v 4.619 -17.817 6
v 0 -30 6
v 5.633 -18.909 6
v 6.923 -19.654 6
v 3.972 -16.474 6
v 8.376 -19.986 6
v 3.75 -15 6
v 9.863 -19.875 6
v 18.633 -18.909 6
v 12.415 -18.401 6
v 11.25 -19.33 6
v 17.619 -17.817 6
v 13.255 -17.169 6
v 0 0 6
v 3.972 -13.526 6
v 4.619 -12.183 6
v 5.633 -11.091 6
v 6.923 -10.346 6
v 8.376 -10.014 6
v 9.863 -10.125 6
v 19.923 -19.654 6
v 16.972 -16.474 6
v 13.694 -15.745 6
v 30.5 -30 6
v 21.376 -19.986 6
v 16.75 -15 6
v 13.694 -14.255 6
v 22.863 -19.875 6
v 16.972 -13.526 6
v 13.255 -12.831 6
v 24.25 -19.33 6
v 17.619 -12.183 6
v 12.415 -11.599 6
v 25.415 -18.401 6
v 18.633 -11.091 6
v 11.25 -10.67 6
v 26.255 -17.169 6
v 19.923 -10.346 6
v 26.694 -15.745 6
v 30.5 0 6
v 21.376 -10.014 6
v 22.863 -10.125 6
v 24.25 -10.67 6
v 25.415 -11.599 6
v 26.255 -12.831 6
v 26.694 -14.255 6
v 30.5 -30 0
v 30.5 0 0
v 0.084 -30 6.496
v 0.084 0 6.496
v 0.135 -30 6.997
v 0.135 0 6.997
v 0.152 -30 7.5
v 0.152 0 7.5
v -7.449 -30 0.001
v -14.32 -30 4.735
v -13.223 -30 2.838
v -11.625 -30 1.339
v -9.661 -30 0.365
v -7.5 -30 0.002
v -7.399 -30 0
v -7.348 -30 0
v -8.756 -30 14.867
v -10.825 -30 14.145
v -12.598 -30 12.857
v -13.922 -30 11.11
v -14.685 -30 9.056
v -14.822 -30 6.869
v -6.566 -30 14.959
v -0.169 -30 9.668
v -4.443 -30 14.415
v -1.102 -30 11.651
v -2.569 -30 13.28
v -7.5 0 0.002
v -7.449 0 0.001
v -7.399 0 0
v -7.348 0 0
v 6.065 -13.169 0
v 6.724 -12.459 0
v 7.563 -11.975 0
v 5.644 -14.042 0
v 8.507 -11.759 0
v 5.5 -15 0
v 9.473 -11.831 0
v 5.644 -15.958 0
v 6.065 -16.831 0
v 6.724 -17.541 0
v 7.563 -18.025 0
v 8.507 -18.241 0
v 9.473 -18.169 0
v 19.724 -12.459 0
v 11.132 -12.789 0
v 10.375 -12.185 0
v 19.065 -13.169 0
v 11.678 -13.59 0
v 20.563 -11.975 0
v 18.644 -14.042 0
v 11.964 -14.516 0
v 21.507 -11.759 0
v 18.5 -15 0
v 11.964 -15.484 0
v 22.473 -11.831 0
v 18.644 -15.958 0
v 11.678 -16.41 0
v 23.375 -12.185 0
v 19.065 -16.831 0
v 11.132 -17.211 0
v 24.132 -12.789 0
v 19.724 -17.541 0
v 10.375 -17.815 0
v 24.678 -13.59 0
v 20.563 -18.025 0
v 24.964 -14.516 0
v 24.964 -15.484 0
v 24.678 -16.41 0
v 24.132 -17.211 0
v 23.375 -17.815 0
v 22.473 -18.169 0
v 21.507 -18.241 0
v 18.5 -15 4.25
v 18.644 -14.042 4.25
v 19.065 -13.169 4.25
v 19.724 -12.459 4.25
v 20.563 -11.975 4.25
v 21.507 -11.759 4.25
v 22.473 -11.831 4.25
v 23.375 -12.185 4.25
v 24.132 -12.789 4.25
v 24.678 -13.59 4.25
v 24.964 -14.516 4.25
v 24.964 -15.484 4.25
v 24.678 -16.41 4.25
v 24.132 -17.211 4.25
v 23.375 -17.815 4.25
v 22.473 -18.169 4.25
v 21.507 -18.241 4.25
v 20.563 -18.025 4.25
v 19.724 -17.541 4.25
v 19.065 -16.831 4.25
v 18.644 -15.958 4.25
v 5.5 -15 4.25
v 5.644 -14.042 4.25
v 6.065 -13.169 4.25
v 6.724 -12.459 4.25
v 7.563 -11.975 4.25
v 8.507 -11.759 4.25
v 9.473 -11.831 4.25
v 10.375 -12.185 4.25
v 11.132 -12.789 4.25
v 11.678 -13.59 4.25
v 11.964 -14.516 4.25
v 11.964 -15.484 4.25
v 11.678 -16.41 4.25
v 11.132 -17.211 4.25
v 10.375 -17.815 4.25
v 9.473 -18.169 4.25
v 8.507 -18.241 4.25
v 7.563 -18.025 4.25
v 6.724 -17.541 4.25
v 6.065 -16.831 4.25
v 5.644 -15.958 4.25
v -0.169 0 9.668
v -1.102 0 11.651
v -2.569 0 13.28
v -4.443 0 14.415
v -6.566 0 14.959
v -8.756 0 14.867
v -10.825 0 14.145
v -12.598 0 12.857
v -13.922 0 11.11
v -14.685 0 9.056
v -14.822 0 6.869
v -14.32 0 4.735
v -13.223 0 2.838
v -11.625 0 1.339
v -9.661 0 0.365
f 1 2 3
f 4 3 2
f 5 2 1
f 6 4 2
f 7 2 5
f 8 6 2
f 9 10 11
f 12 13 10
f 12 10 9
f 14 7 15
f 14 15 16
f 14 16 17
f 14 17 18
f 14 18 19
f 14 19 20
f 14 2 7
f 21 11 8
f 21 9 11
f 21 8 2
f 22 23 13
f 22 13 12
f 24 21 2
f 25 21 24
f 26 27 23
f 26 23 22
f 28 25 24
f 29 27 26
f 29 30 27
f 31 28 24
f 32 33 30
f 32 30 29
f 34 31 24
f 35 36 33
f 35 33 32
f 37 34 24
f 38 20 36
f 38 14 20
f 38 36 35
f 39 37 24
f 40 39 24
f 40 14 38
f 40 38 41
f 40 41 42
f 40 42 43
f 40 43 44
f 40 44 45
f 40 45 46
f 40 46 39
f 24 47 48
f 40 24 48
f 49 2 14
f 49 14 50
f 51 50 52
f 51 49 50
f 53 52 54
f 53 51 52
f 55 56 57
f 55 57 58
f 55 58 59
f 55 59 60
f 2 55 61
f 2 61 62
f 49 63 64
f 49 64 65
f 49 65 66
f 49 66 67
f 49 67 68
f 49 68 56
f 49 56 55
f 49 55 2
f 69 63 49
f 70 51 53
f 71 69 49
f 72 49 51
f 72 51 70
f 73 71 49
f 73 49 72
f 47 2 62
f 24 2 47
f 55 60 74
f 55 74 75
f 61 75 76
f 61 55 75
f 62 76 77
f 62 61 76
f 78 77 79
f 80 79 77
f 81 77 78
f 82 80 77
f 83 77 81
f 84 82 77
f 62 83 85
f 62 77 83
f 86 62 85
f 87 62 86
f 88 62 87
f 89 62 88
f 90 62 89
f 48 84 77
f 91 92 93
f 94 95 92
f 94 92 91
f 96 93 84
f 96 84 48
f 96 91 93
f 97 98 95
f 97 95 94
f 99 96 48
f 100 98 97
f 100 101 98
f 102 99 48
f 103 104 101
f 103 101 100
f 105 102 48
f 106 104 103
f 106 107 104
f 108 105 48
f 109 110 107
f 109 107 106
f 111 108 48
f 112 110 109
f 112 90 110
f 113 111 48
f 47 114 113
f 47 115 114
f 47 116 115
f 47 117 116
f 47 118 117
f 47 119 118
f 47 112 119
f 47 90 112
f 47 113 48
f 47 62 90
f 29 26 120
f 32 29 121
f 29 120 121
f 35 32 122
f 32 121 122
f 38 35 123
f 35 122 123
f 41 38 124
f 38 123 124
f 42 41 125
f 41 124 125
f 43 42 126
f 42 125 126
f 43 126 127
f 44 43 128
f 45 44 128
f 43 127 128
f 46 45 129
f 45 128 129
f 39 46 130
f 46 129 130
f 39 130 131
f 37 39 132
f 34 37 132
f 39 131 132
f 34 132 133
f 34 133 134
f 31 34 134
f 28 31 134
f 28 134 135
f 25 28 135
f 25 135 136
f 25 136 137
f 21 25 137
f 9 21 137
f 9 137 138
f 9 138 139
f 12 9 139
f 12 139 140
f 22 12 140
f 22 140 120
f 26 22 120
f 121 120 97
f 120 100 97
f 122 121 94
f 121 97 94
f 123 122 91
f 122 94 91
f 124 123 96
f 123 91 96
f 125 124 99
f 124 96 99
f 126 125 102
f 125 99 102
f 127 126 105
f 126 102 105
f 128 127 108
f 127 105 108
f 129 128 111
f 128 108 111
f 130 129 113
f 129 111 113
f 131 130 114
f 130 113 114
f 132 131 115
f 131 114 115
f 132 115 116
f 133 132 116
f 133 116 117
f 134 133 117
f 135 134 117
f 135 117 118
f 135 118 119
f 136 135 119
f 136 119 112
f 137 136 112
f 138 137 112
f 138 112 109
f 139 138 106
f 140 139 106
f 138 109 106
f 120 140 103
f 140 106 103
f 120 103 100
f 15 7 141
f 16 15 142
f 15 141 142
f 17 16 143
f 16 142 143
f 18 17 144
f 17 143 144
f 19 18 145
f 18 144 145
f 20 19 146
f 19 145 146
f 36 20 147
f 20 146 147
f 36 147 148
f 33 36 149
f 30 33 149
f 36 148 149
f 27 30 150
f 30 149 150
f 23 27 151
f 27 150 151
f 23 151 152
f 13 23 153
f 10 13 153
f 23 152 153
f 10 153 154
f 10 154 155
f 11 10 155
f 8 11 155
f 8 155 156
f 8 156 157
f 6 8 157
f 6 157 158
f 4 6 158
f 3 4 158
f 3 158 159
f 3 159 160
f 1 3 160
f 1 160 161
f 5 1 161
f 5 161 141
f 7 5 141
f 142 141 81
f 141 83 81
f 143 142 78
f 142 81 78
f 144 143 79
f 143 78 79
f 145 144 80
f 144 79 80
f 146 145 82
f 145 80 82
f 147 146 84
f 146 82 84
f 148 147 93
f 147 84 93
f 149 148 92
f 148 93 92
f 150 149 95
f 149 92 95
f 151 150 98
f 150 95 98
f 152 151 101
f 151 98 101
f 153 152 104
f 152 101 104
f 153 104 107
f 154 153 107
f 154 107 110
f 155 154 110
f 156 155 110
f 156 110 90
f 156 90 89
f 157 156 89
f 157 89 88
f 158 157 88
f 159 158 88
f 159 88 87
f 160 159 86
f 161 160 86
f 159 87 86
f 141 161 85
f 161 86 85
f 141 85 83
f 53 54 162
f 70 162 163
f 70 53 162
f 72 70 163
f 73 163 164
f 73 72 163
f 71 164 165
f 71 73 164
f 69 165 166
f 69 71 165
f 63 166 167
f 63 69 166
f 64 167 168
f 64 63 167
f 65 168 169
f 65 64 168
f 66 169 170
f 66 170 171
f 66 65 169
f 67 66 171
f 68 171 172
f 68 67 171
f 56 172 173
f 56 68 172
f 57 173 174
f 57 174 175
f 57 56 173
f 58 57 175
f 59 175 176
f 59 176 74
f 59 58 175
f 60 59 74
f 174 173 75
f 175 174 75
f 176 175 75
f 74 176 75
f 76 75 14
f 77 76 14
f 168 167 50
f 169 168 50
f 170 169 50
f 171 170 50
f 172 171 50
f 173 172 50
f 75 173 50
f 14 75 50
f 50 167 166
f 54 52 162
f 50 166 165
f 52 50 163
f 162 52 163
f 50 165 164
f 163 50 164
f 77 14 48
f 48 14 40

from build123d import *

# Parameters (mm, degrees)
SKETCH_1_W                   = 30.5
SKETCH_1_H                   = 30
EXTRUDE_1_DEPTH              = 6
HOLE_WIZARD_M6_1_D           = 6.5
HOLE_WIZARD_M6_1_CSINK_D     = 10
HOLE_WIZARD_M6_1_CSINK_ANGLE = 90
EXTRUDE_3_DEPTH              = 30


with BuildPart() as part:
    # 草图1 → 凸台-拉伸1 (new body)
    with BuildSketch(Plane.XY):
        with Locations((15.25, -15)):
            Rectangle(SKETCH_1_W, SKETCH_1_H)
    extrude(amount=EXTRUDE_1_DEPTH)

    # M6 内六角花形半沉头螺钉的锥形沉头孔1 (through all)
    with Locations(Plane.XY.offset(6)):
        with Locations((8.75, -15), (21.75, -15)):
            CounterSinkHole(HOLE_WIZARD_M6_1_D / 2, HOLE_WIZARD_M6_1_CSINK_D / 2, counter_sink_angle=HOLE_WIZARD_M6_1_CSINK_ANGLE)

    # 草图5 → 凸台-拉伸3 (add)
    with BuildSketch(Plane.XZ.offset(30)):
        with BuildLine():
            ThreePointArc((0.151530772, 7.5), (-12.597922496, 12.856607172), (-7.5, 0.001530928))
            Line((-7.5, 0.001530928), (-7.5, 6))
            Line((-7.5, 6), (0, 6))
            ThreePointArc((0, 6), (0.113551919, 6.746182785), (0.151530772, 7.5))
        make_face()
        with BuildLine():
            ThreePointArc((-7.5, 0.001530928), (-7.424238481, 0.000382742), (-7.348469228, 0))
            ThreePointArc((-7.348469228, 0), (-2.605052738, 1.690524981), (0, 6))
            Line((0, 6), (-7.5, 6))
            Line((-7.5, 6), (-7.5, 0.001530928))
        make_face()
        with BuildLine():
            Line((-7.348469228, 0), (0, 0))
            Line((0, 0), (0, 6))
            ThreePointArc((0, 6), (-2.605052738, 1.690524981), (-7.348469228, 0))
        make_face()
    extrude(amount=-EXTRUDE_3_DEPTH)


solid = part.part
